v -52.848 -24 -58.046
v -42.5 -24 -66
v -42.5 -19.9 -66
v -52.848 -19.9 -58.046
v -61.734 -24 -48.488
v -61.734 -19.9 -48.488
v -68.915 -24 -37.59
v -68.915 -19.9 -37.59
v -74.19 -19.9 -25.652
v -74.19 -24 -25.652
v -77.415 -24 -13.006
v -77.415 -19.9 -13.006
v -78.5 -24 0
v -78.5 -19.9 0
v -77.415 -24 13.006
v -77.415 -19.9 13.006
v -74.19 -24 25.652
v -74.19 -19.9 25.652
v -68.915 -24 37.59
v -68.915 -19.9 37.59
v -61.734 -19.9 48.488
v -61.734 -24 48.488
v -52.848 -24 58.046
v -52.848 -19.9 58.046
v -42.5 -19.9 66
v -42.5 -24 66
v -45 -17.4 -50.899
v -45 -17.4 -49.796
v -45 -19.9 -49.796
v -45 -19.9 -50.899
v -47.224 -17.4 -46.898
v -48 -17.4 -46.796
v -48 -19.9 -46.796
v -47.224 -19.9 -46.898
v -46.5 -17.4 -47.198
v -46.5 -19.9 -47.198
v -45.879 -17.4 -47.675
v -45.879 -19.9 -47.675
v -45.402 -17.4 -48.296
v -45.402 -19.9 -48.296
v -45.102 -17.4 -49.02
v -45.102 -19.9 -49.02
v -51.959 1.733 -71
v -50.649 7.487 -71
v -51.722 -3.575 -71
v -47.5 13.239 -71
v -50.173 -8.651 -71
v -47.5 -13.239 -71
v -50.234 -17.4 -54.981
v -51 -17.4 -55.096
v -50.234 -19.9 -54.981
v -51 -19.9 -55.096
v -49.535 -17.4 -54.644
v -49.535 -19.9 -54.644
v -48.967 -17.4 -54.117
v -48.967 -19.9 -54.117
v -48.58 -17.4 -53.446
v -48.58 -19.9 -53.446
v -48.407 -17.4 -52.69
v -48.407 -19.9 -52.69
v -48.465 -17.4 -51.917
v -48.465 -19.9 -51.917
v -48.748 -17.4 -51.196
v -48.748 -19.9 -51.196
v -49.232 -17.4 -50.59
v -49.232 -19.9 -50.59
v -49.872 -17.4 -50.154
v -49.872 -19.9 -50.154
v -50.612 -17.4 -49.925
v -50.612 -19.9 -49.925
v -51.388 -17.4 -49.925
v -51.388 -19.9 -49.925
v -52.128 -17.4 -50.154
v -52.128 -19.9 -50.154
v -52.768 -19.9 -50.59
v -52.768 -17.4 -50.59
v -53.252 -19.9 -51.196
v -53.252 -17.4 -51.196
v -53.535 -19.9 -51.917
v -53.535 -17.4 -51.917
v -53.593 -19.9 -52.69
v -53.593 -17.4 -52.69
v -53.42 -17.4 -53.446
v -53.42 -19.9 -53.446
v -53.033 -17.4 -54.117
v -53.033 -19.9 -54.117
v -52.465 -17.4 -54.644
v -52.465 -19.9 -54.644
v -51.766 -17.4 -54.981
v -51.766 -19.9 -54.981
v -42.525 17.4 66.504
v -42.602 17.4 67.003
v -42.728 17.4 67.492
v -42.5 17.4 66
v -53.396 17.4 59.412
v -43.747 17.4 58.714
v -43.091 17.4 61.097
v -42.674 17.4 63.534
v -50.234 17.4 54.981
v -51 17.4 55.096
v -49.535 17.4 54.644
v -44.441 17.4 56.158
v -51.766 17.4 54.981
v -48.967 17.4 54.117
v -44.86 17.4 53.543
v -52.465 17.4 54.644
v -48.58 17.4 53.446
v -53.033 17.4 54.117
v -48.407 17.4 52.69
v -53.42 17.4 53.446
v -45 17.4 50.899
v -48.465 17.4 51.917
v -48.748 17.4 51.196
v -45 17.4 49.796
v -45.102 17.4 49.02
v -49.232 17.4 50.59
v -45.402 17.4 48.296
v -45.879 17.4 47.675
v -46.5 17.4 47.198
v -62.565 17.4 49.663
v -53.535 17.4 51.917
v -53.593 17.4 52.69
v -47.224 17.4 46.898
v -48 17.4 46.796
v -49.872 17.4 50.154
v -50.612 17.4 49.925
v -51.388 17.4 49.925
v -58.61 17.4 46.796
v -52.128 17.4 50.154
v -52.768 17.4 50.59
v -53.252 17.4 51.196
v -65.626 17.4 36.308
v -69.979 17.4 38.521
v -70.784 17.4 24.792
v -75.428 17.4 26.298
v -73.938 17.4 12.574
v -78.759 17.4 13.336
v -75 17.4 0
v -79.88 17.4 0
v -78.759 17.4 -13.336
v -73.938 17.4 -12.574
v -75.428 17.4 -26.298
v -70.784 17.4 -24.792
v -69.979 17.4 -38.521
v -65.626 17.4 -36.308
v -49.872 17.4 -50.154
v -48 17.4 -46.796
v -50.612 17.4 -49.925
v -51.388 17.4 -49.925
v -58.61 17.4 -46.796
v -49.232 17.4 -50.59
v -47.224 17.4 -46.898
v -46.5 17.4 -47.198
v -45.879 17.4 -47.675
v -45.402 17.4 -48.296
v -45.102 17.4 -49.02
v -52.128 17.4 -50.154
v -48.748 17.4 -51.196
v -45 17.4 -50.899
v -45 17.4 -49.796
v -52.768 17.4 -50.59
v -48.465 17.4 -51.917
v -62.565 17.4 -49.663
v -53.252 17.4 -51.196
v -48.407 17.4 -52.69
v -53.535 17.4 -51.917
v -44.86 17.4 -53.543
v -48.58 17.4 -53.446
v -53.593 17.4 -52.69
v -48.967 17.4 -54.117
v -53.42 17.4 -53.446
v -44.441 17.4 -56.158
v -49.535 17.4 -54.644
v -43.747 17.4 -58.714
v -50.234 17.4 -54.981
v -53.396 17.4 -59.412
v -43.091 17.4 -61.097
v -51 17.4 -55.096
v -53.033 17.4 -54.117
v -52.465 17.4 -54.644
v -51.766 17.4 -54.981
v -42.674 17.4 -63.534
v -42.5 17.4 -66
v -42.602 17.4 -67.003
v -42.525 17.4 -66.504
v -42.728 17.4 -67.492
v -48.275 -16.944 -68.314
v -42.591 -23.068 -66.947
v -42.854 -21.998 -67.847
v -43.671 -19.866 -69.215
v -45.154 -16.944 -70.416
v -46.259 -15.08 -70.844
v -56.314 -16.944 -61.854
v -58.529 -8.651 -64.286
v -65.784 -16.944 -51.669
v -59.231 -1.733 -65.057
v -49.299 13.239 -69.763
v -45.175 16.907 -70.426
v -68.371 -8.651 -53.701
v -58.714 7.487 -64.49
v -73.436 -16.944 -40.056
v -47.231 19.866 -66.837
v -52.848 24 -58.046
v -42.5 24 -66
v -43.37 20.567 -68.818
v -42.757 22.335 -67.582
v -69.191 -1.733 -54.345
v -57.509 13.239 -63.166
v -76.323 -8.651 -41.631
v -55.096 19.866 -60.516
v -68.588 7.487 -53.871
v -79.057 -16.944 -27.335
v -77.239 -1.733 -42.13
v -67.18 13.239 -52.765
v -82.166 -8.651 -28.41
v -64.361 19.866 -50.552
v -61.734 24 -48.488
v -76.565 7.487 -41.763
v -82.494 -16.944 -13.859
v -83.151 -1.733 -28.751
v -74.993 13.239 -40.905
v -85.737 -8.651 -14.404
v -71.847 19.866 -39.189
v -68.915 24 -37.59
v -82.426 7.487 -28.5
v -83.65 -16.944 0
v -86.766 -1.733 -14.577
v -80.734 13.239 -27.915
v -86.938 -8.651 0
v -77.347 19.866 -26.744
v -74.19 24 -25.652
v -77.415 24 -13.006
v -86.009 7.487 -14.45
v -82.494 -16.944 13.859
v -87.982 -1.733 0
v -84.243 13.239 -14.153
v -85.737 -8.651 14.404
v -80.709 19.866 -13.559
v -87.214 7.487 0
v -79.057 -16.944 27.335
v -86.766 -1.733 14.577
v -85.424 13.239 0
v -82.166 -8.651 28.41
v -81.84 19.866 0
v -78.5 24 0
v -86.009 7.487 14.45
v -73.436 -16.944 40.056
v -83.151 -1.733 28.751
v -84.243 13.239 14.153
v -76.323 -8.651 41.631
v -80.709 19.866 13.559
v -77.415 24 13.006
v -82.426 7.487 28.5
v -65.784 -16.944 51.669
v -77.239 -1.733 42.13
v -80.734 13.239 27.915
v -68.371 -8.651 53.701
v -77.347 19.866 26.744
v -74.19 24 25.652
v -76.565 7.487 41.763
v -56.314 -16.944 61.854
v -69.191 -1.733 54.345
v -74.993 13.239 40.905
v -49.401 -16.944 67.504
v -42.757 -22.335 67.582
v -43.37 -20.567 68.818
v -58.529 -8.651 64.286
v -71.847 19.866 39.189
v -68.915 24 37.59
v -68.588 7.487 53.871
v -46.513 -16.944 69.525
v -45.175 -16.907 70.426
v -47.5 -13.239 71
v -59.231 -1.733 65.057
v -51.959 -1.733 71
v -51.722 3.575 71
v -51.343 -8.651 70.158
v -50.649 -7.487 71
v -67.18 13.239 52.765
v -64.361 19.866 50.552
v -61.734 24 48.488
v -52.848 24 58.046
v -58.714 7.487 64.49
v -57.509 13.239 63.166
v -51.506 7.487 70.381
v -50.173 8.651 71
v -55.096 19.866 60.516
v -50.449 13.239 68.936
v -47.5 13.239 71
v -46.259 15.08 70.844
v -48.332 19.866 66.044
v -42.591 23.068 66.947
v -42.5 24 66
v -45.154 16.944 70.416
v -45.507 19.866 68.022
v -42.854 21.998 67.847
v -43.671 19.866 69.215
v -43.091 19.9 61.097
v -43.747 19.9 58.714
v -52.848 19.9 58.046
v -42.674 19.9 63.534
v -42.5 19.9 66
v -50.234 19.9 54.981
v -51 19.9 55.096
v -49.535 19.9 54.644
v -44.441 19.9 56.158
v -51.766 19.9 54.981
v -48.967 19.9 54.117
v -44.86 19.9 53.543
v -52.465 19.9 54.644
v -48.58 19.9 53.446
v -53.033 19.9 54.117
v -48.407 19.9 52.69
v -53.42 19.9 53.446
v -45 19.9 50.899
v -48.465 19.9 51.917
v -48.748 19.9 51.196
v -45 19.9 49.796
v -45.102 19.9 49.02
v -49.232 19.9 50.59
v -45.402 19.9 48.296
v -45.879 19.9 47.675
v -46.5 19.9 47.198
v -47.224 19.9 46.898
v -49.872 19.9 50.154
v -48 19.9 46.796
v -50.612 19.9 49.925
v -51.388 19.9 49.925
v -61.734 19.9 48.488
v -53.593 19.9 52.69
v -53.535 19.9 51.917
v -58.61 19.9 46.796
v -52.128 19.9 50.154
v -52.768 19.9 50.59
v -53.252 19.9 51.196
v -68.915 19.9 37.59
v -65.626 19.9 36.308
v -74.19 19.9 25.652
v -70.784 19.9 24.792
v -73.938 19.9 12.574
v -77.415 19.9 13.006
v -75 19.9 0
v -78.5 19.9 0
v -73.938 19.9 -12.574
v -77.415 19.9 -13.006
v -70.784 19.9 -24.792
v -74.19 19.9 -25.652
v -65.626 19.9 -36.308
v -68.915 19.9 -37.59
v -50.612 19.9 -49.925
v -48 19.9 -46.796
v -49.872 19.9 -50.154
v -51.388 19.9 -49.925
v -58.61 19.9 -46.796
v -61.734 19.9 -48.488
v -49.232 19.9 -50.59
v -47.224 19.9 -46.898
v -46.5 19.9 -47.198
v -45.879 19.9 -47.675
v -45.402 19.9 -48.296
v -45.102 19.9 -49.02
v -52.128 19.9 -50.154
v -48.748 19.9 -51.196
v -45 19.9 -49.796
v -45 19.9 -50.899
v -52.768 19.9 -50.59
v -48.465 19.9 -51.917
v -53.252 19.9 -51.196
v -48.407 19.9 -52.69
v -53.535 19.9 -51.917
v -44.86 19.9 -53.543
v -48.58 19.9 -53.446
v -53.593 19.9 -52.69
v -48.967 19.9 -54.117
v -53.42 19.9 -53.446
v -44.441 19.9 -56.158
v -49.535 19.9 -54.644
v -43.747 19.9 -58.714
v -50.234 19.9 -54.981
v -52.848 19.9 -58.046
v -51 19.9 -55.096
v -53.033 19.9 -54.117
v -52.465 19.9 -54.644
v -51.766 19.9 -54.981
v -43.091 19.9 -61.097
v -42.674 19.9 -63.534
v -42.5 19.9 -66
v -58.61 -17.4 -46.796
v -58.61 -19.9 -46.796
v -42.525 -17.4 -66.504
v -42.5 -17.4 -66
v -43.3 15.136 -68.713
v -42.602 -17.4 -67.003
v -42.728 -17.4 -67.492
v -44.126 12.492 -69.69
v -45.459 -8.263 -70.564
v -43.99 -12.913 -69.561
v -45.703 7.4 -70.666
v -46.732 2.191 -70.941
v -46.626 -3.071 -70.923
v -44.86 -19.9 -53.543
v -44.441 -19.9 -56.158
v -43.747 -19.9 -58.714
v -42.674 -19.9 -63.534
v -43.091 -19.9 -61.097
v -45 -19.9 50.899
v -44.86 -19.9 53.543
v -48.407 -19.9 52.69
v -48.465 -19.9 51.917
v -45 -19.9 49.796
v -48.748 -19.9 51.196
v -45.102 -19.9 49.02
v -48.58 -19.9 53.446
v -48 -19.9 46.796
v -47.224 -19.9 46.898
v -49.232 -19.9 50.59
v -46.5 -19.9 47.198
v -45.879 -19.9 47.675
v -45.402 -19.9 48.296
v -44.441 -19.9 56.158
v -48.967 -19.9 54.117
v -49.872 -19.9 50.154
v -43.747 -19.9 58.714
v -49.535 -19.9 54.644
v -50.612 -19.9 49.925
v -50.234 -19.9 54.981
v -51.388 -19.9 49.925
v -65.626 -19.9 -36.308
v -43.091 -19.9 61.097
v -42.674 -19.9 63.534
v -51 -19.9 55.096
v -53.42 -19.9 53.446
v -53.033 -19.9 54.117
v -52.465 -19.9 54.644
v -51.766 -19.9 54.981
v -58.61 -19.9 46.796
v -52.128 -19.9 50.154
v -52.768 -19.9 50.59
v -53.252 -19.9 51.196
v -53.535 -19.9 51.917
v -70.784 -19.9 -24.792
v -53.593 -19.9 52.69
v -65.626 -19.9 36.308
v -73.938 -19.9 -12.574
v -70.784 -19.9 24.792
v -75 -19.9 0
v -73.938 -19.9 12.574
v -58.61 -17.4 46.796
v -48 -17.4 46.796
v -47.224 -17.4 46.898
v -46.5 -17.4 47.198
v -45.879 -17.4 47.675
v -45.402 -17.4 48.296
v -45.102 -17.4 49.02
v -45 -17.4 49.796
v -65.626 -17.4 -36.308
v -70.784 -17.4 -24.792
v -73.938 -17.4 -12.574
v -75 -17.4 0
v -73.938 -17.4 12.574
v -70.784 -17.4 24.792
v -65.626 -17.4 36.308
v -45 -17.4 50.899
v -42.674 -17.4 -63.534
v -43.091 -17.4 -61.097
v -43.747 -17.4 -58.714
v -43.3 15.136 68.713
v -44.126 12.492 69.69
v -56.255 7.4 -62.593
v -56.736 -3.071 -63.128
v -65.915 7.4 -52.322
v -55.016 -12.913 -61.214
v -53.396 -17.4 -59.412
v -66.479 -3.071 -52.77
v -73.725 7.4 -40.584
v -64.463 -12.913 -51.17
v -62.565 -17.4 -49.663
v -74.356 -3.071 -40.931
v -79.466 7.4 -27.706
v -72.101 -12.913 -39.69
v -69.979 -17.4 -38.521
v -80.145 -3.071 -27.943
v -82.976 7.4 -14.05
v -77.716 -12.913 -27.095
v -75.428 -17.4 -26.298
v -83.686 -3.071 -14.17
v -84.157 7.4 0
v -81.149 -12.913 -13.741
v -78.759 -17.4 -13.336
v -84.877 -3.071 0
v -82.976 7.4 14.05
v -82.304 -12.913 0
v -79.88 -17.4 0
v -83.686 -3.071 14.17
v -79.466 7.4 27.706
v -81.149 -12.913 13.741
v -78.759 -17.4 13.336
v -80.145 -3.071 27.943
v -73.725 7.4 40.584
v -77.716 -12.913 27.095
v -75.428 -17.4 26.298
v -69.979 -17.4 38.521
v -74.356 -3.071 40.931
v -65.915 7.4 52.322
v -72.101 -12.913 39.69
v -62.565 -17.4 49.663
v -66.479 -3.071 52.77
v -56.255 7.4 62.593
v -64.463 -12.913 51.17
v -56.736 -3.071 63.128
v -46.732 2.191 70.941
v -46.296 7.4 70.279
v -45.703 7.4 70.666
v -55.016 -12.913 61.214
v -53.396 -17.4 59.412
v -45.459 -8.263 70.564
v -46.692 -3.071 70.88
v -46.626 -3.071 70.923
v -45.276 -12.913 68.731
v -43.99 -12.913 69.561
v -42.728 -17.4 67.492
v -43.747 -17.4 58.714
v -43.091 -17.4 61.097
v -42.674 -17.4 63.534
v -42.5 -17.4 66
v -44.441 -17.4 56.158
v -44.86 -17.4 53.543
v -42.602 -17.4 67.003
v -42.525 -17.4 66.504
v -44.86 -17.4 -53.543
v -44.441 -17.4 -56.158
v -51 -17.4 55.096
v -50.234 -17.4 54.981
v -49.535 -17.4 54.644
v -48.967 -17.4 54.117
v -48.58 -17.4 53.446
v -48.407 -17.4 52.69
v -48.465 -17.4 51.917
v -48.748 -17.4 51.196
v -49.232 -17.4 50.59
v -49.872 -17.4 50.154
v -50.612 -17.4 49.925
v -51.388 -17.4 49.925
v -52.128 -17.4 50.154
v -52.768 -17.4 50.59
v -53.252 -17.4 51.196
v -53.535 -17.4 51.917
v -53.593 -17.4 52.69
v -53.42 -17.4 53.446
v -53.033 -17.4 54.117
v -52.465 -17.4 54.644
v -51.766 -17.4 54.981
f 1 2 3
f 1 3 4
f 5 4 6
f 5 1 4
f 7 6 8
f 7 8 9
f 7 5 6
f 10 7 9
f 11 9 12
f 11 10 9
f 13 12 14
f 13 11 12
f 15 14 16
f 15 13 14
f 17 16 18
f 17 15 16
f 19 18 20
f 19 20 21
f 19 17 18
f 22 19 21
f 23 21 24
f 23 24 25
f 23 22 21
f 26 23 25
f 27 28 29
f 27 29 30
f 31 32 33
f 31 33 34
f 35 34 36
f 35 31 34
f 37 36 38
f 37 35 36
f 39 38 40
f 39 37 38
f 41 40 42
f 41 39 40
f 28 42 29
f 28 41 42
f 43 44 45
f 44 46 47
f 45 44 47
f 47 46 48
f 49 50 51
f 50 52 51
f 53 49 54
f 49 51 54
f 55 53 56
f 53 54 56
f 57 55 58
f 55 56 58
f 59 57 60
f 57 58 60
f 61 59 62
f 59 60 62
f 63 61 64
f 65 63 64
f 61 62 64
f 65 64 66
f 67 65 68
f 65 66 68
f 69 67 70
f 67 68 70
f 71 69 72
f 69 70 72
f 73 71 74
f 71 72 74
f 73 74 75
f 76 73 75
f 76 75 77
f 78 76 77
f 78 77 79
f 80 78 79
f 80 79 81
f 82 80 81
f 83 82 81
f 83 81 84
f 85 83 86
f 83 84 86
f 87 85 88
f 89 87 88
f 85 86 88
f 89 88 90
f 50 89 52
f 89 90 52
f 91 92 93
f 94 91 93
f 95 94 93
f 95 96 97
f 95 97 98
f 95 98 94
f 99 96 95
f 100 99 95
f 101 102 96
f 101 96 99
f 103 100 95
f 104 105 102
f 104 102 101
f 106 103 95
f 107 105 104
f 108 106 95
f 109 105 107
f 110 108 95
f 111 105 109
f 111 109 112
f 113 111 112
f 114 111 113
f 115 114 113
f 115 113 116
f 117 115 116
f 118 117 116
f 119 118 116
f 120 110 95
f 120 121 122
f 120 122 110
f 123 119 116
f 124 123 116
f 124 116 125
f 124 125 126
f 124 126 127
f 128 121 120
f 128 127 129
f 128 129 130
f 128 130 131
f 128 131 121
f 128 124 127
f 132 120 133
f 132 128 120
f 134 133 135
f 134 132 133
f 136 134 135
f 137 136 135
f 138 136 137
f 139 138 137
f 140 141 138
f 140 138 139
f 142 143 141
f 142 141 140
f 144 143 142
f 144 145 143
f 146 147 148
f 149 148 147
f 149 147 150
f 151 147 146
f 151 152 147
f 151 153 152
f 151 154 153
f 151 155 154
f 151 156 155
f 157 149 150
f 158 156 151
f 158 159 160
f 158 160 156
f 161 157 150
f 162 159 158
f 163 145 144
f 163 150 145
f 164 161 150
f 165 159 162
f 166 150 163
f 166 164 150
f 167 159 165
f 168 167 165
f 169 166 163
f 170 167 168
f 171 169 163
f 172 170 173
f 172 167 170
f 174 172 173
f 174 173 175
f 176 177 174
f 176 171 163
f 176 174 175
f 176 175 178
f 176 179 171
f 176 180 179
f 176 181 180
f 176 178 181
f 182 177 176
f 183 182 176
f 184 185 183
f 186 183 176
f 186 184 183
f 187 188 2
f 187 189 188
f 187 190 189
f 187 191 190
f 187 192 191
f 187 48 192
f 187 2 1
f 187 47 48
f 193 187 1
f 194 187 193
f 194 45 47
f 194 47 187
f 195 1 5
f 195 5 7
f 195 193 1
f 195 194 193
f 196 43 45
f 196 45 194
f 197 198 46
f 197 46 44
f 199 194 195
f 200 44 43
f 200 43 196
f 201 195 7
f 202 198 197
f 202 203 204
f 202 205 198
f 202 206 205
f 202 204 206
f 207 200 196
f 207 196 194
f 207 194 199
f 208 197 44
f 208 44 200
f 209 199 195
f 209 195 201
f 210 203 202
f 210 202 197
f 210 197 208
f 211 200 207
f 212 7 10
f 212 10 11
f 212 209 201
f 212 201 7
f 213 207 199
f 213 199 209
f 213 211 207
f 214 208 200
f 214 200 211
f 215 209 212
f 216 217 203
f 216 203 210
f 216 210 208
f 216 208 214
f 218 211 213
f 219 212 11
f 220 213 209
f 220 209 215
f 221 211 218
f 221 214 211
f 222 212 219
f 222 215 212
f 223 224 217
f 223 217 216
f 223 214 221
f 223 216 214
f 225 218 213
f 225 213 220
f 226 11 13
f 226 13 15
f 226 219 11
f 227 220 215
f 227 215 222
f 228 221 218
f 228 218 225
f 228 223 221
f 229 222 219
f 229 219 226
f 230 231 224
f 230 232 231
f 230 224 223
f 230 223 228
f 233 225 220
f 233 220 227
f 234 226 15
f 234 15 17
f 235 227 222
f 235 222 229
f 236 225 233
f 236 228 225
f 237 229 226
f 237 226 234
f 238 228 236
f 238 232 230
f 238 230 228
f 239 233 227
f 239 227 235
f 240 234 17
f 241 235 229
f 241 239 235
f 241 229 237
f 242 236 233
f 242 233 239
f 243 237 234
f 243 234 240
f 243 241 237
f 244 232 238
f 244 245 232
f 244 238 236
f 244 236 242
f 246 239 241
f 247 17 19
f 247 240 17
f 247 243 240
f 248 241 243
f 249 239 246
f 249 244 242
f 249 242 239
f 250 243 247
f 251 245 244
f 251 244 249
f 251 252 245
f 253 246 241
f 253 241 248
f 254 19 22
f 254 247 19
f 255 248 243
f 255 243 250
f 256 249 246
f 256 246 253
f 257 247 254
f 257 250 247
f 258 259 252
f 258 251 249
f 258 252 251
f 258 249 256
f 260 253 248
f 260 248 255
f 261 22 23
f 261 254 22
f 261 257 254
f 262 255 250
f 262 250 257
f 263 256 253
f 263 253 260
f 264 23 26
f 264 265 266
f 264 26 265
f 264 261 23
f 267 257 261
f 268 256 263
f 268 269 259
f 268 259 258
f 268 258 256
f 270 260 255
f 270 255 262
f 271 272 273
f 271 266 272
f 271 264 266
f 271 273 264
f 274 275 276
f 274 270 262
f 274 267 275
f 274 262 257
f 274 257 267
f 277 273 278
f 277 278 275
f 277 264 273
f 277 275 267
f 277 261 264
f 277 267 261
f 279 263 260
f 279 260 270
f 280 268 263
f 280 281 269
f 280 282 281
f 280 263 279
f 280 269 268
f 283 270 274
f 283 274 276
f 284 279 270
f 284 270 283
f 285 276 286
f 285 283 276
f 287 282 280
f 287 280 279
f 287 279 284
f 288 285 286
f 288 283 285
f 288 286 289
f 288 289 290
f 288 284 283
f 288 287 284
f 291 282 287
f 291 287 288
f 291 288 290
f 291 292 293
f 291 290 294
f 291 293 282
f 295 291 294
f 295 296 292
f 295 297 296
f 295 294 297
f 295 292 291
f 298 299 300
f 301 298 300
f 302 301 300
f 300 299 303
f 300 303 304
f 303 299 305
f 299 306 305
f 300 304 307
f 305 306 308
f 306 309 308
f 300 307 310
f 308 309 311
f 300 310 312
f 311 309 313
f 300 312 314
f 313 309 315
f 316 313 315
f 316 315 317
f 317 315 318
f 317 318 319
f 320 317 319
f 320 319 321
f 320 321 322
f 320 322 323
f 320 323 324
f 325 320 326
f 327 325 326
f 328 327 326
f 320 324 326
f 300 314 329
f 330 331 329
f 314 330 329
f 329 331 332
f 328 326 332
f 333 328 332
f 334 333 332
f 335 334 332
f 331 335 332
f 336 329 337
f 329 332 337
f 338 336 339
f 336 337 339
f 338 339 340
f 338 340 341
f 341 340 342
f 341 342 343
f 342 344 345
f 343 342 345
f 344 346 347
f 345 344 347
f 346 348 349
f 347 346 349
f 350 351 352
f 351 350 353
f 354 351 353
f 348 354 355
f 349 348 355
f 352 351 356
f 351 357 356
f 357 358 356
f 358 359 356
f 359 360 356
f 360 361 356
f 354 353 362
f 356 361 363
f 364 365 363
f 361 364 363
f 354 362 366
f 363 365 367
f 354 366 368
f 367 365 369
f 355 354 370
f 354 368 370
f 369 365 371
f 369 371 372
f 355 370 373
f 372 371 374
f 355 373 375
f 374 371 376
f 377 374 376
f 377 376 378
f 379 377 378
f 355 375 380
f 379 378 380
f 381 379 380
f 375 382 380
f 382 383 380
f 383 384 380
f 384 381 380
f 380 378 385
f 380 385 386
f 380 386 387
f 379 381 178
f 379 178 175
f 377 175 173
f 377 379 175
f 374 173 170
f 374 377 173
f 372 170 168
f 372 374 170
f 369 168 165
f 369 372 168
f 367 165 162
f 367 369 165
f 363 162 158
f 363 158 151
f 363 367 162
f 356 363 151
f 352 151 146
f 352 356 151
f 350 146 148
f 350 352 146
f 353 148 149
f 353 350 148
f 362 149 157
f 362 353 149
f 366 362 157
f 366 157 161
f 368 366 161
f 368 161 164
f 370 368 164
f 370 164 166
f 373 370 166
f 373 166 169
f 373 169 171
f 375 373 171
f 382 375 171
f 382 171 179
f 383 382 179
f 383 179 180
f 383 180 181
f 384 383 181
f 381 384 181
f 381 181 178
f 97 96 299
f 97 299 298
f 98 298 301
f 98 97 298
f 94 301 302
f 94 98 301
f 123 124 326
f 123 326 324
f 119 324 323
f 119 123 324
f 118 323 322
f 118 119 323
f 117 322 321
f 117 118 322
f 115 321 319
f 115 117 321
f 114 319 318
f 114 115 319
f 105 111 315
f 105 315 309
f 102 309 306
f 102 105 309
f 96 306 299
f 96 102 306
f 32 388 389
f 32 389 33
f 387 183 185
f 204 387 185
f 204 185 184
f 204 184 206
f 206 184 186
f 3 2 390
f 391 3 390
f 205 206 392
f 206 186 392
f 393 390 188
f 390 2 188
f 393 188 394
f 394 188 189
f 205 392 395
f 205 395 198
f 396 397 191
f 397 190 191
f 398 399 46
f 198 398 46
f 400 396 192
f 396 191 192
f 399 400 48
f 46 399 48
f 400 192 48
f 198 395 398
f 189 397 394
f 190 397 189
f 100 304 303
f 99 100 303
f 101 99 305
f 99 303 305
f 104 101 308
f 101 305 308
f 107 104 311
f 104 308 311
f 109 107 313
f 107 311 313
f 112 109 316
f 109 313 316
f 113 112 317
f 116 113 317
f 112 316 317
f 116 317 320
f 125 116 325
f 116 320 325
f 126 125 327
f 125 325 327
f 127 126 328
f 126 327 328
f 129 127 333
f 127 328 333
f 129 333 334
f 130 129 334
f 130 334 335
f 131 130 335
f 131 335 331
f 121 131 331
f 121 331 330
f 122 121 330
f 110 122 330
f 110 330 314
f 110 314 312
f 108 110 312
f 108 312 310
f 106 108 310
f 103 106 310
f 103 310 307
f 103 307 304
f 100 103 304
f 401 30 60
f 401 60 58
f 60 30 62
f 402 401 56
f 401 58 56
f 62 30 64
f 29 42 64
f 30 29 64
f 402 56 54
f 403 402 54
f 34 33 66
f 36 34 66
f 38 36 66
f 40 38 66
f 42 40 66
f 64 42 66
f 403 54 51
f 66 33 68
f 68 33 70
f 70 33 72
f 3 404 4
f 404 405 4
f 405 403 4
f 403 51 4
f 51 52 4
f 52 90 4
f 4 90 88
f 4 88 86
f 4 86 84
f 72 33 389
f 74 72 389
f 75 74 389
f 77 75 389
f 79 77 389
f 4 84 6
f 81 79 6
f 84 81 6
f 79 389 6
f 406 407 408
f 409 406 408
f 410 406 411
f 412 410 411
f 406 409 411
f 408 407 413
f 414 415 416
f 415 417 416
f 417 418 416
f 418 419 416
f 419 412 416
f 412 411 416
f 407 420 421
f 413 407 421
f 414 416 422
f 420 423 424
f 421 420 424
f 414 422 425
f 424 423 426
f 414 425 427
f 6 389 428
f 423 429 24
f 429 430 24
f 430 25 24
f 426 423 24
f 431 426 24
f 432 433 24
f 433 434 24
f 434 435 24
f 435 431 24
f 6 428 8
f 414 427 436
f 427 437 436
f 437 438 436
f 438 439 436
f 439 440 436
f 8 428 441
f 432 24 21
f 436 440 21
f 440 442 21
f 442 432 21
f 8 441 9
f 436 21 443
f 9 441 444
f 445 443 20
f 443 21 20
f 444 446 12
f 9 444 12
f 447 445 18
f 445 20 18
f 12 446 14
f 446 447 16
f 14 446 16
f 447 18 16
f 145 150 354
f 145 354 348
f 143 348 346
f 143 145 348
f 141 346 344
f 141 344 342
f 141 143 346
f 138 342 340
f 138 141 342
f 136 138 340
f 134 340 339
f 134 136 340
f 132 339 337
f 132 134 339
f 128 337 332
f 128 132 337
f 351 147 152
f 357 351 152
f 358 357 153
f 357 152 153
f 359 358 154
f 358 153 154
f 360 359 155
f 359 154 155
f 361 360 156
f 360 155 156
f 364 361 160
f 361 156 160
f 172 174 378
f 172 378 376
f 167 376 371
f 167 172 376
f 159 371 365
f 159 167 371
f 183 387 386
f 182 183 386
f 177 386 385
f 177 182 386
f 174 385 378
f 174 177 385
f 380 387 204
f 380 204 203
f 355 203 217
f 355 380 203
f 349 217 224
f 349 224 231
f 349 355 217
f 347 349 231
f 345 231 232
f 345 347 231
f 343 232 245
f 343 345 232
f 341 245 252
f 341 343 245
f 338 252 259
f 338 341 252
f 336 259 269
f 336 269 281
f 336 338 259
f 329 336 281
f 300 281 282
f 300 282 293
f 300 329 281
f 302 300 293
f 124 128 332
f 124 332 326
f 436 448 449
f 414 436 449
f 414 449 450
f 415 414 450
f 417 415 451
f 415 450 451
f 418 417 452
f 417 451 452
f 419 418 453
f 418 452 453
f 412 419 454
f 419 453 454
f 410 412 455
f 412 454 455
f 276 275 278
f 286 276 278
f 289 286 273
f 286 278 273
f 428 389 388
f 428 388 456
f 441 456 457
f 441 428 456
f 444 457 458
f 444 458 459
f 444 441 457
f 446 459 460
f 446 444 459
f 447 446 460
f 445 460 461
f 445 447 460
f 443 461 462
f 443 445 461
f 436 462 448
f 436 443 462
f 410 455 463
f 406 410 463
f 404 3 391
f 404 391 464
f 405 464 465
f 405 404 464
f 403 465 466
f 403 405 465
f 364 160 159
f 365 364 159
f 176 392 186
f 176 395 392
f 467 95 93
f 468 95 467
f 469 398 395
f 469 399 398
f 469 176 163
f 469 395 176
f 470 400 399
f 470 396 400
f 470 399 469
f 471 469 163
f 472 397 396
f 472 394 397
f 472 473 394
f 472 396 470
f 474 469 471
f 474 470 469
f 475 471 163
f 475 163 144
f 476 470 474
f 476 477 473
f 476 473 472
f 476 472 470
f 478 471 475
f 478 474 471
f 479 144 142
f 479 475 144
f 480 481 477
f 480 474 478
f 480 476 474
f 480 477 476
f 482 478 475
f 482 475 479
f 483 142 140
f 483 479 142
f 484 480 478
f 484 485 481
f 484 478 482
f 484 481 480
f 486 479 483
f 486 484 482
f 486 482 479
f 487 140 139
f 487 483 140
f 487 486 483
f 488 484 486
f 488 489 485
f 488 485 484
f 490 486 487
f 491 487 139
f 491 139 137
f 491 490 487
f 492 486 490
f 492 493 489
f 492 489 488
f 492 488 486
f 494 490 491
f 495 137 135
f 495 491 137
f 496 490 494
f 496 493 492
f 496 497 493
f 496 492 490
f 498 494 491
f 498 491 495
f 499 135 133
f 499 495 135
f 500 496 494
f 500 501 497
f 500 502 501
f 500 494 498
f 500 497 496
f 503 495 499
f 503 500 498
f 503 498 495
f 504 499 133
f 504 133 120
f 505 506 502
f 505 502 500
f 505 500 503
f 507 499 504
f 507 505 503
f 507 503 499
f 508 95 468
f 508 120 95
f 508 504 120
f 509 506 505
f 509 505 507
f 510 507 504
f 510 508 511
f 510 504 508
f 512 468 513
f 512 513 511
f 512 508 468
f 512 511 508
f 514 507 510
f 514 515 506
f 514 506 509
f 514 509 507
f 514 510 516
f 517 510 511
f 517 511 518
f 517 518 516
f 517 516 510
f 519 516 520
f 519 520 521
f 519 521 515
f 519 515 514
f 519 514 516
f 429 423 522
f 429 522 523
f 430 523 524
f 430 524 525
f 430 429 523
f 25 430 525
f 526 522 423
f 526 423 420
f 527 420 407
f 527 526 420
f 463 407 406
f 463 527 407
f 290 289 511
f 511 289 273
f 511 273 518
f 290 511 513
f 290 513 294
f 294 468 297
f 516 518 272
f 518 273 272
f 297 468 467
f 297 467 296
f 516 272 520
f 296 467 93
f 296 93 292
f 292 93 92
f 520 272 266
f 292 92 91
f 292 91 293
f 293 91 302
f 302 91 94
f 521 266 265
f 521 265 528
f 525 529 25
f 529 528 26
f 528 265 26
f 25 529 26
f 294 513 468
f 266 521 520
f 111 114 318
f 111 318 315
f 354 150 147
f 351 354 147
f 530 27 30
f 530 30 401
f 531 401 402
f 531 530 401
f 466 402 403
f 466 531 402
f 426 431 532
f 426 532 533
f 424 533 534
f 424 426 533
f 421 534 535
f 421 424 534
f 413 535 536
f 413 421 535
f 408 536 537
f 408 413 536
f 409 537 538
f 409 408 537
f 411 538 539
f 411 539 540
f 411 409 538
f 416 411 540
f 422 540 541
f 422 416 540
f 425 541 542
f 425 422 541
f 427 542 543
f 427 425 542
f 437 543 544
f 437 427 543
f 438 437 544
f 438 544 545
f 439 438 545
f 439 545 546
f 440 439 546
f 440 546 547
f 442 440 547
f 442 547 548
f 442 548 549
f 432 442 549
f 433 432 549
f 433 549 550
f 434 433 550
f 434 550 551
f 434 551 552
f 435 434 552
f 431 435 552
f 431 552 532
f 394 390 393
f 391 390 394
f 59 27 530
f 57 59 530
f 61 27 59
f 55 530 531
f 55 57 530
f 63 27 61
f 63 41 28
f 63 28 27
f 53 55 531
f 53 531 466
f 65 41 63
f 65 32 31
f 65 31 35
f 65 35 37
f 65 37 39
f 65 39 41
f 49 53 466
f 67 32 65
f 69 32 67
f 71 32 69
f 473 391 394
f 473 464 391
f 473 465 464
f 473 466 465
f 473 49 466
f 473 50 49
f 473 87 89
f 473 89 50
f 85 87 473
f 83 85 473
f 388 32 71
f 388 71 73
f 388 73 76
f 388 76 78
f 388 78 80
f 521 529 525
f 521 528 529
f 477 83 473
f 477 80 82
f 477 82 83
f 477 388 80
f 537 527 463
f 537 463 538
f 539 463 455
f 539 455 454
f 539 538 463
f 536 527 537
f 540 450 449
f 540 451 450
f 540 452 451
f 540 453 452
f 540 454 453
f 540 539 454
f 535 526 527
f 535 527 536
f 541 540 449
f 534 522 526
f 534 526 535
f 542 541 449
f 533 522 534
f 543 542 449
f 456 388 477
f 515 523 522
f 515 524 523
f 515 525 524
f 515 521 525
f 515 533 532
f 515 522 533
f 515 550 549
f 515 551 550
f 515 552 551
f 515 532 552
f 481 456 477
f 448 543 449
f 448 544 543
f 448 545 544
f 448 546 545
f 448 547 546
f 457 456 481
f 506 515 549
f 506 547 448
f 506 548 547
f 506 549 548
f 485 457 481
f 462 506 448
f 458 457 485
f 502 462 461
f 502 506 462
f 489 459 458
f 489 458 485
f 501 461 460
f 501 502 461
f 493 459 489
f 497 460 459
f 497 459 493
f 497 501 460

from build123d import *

# Parameters (mm, degrees)
REVOLVE1_ANGLE          = 120.922435
CUT_EXTRUDE1_DEPTH      = 120.118916294
CUT_EXTRUDE1_DEPTH_BACK = 120.118916294
BOSS_EXTRUDE2_DEPTH     = 2.5
CUT_EXTRUDE2_REACH      = 123.312
SKETCH5_R               = 2.6
MIRROR4_COPY_1_DEPTH    = 2.5
MIRROR4_COPY_2_REACH    = 123.312
MIRROR4_COPY_2_SKETCH_R = 2.6
FILLET2_R               = 25
FILLET3_START           = -21
FILLET3_DEPTH           = 42


with BuildPart() as part:
    # Revolve1: read off the stored shape, not the designer's step
    # Revolve1 outline → Revolve1 (revolve)
    with BuildSketch(Plane(origin=(0, 0, 0), x_dir=(-0.49301257198087967, 0, -0.8700221858486127), z_dir=(0.8700221858486127, 0, -0.49301257198087967))):
        with BuildLine():
            Line((78.5, 24), (78.5, 19.9))
            Line((78.5, 19.9), (75, 19.9))
            Line((75, 19.9), (75, 17.4))
            Line((75, 17.4), (79.88043342, 17.4))
            ThreePointArc((79.88043342, 17.4), (85.024521594, 0), (79.88043342, -17.4))
            Line((79.88043342, -17.4), (75, -17.4))
            Line((75, -17.4), (75, -19.9))
            Line((75, -19.9), (78.5, -19.9))
            Line((78.5, -19.9), (78.5, -24))
            ThreePointArc((78.5, -24), (88.024521594, 0), (78.5, 24))
        make_face()
    revolve(axis=Axis((0, 0, 0), (0, 1, 0)), revolution_arc=REVOLVE1_ANGLE)

    # Sketch3 → Cut-Extrude1 (cut, two sides: drawn at the far end of the back side and taken through both)
    with BuildSketch(Plane(origin=(0, 0, 0), x_dir=(1, 0, 0), z_dir=(0, 1, 0)).offset(-CUT_EXTRUDE1_DEPTH_BACK)):
        with BuildLine():
            Line((-42.5, -66), (-42.5, 66))
            ThreePointArc((-42.5, 66), (-43.964466094, 69.535533906), (-47.5, 71))
            Line((-47.5, 71), (-70.072780864, 71))
            Line((-70.072780864, 71), (-70.072780864, 87.352336772))
            Line((-70.072780864, 87.352336772), (-35.072780864, 87.352336772))
            Line((-35.072780864, 87.352336772), (-35.072780864, -87.352336772))
            Line((-35.072780864, -87.352336772), (-70.072780864, -87.352336772))
            Line((-70.072780864, -87.352336772), (-70.072780864, -71))
            Line((-70.072780864, -71), (-47.5, -71))
            ThreePointArc((-47.5, -71), (-43.964466094, -69.535533906), (-42.5, -66))
        make_face()
    extrude(amount=CUT_EXTRUDE1_DEPTH + CUT_EXTRUDE1_DEPTH_BACK, mode=Mode.SUBTRACT)

    # Sketch4 → Boss-Extrude2 (add)
    with BuildSketch(Plane.XZ.offset(-17.4)):
        with BuildLine():
            Line((-58.609991163, 46.796035472), (-48, 46.796035472))
            ThreePointArc((-48, 46.796035472), (-45.878679656, 47.674715128), (-45, 49.796035472))
            Line((-45, 49.796035472), (-45, 60))
            ThreePointArc((-45, 60), (-52.223976649, 53.829882621), (-58.609991163, 46.796035472))
        make_face()
    boss_extrude2 = extrude(amount=-BOSS_EXTRUDE2_DEPTH)

    # Sketch5 → Cut-Extrude2 (cut, up to next)
    with BuildSketch(Plane(origin=(0, 19.9, 0), x_dir=(1, 0, 0), z_dir=(0, 1, 0)), mode=Mode.PRIVATE) as cut_extrude2_sk1:
        with Locations(Location((-51, -52.496035472, 0), (0, 0, 270))):
            Circle(SKETCH5_R)
    cut_extrude2_tool1 = extrude(cut_extrude2_sk1.sketch, amount=-CUT_EXTRUDE2_REACH, mode=Mode.PRIVATE) & part.part
    cut_extrude2 = cut_extrude2_tool1.solids().sort_by_distance((-51, 19.9, 52.496035))[0]
    add(cut_extrude2, mode=Mode.SUBTRACT)

    # Mirror3: Boss-Extrude2, Cut-Extrude2 across plane
    add(boss_extrude2.mirror(Plane.XY))
    add(cut_extrude2.mirror(Plane.XY), mode=Mode.SUBTRACT)

    # Mirror4: Boss-Extrude2, Cut-Extrude2 across plane
    add(boss_extrude2.mirror(Plane.ZX))
    add(cut_extrude2.mirror(Plane.ZX), mode=Mode.SUBTRACT)

    # Mirror4 copy 1 sketch → Mirror4 copy 1 (add)
    with BuildSketch(Plane(origin=(0, -17.4, 0), x_dir=(1, 0, 0), z_dir=(0, 1, 0))):
        with BuildLine():
            Line((-58.609991163, 46.796035472), (-48, 46.796035472))
            ThreePointArc((-48, 46.796035472), (-45.878679656, 47.674715128), (-45, 49.796035472))
            Line((-45, 49.796035472), (-45, 60))
            ThreePointArc((-45, 60), (-52.223976649, 53.829882621), (-58.609991163, 46.796035472))
        make_face()
    extrude(amount=-MIRROR4_COPY_1_DEPTH)

    # Mirror4 copy 2 sketch → Mirror4 copy 2 (cut, up to next)
    with BuildSketch(Plane.XZ.offset(19.9), mode=Mode.PRIVATE) as mirror4_copy_2_sk1:
        with Locations(Location((-51, -52.496035472, 0), (0, 0, 270))):
            Circle(MIRROR4_COPY_2_SKETCH_R)
    mirror4_copy_2_tool1 = extrude(mirror4_copy_2_sk1.sketch, amount=-MIRROR4_COPY_2_REACH, mode=Mode.PRIVATE) & part.part
    add(mirror4_copy_2_tool1.solids().sort_by_distance((-51, -19.9, -52.496035))[0], mode=Mode.SUBTRACT)

    # Fillet2
    # the kernel refuses this fillet: 25 mm, written as the material it adds along each edge
    with BuildSketch(Plane(origin=(-45, 17.4, 60), x_dir=(0.8121446027945783, 0, 0.5834562058557923), z_dir=(0, 1, 0)), Plane(origin=(-45, -17.4, -60), x_dir=(0.812144602794579, 0, -0.5834562058557914), z_dir=(0, -1, 0))) as fillet2_piece_1:
        with BuildLine():
            CenterArc((14.993456513, 21.97790526), FILLET2_R, 215.694002743, 25.841932763)
            Line((-5.310158556, 7.391500113), (-5.716230858, 7.09977201))
            Line((-5.716230858, 7.09977201), (-0.406072301, -0.291728103))
            Line((-0.406072301, -0.291728103), (-0.010260898, -0.499894703))
            ThreePointArc((-0.010260898, -0.499894703), (1.539134774, -0.515794569), (2.83996581, -0.439558105))
            Line((2.83996581, -0.439558105), (3.078269549, 0))
        make_face()
    extrude(amount=2.5)
    with BuildSketch(Plane(origin=(-45, -17.4, 60), x_dir=(0.8121446027945783, 0, 0.5834562058557923), z_dir=(0, -1, 0)), Plane(origin=(-45, 17.4, -60), x_dir=(0.812144602794579, 0, -0.5834562058557914), z_dir=(0, 1, 0))) as fillet2_piece_2:
        with BuildLine():
            CenterArc((14.993456513, -21.97790526), FILLET2_R, 118.464064493, 25.841932763)
            Line((-5.310158556, -7.391500113), (-5.716230858, -7.09977201))
            Line((-5.716230858, -7.09977201), (-0.406072301, 0.291728103))
            Line((-0.406072301, 0.291728103), (-0.010260898, 0.499894703))
            ThreePointArc((-0.010260898, 0.499894703), (1.539134774, 0.515794569), (2.83996581, 0.439558105))
            Line((2.83996581, 0.439558105), (3.078269549, 0))
        make_face()
    extrude(amount=2.5)

    # Fillet3: read off the stored shape, not the designer's step
    # Fillet3 outline → Fillet3 (cut)
    with BuildSketch(Plane(origin=(0, 0, 0), x_dir=(1, 0, 0), z_dir=(0, 1, 0)).offset(FILLET3_START)):
        with BuildLine():
            ThreePointArc((-42.5, -61.796035472), (-43.174912338, -60.275537983), (-43.747209157, -58.713521457))
            ThreePointArc((-43.747209157, -58.713521457), (-42.852791856, -62.310406361), (-42.5, -66))
            Line((-42.5, -66), (-42.5, -61.796035472))
        make_face()
        with BuildLine():
            ThreePointArc((-42.5, 66), (-42.852791856, 62.310406361), (-43.747209157, 58.713521457))
            ThreePointArc((-43.747209157, 58.713521457), (-43.174912338, 60.275537983), (-42.5, 61.796035472))
            Line((-42.5, 61.796035472), (-42.5, 66))
        make_face()
    extrude(amount=FILLET3_DEPTH, mode=Mode.SUBTRACT)


solid = part.part
